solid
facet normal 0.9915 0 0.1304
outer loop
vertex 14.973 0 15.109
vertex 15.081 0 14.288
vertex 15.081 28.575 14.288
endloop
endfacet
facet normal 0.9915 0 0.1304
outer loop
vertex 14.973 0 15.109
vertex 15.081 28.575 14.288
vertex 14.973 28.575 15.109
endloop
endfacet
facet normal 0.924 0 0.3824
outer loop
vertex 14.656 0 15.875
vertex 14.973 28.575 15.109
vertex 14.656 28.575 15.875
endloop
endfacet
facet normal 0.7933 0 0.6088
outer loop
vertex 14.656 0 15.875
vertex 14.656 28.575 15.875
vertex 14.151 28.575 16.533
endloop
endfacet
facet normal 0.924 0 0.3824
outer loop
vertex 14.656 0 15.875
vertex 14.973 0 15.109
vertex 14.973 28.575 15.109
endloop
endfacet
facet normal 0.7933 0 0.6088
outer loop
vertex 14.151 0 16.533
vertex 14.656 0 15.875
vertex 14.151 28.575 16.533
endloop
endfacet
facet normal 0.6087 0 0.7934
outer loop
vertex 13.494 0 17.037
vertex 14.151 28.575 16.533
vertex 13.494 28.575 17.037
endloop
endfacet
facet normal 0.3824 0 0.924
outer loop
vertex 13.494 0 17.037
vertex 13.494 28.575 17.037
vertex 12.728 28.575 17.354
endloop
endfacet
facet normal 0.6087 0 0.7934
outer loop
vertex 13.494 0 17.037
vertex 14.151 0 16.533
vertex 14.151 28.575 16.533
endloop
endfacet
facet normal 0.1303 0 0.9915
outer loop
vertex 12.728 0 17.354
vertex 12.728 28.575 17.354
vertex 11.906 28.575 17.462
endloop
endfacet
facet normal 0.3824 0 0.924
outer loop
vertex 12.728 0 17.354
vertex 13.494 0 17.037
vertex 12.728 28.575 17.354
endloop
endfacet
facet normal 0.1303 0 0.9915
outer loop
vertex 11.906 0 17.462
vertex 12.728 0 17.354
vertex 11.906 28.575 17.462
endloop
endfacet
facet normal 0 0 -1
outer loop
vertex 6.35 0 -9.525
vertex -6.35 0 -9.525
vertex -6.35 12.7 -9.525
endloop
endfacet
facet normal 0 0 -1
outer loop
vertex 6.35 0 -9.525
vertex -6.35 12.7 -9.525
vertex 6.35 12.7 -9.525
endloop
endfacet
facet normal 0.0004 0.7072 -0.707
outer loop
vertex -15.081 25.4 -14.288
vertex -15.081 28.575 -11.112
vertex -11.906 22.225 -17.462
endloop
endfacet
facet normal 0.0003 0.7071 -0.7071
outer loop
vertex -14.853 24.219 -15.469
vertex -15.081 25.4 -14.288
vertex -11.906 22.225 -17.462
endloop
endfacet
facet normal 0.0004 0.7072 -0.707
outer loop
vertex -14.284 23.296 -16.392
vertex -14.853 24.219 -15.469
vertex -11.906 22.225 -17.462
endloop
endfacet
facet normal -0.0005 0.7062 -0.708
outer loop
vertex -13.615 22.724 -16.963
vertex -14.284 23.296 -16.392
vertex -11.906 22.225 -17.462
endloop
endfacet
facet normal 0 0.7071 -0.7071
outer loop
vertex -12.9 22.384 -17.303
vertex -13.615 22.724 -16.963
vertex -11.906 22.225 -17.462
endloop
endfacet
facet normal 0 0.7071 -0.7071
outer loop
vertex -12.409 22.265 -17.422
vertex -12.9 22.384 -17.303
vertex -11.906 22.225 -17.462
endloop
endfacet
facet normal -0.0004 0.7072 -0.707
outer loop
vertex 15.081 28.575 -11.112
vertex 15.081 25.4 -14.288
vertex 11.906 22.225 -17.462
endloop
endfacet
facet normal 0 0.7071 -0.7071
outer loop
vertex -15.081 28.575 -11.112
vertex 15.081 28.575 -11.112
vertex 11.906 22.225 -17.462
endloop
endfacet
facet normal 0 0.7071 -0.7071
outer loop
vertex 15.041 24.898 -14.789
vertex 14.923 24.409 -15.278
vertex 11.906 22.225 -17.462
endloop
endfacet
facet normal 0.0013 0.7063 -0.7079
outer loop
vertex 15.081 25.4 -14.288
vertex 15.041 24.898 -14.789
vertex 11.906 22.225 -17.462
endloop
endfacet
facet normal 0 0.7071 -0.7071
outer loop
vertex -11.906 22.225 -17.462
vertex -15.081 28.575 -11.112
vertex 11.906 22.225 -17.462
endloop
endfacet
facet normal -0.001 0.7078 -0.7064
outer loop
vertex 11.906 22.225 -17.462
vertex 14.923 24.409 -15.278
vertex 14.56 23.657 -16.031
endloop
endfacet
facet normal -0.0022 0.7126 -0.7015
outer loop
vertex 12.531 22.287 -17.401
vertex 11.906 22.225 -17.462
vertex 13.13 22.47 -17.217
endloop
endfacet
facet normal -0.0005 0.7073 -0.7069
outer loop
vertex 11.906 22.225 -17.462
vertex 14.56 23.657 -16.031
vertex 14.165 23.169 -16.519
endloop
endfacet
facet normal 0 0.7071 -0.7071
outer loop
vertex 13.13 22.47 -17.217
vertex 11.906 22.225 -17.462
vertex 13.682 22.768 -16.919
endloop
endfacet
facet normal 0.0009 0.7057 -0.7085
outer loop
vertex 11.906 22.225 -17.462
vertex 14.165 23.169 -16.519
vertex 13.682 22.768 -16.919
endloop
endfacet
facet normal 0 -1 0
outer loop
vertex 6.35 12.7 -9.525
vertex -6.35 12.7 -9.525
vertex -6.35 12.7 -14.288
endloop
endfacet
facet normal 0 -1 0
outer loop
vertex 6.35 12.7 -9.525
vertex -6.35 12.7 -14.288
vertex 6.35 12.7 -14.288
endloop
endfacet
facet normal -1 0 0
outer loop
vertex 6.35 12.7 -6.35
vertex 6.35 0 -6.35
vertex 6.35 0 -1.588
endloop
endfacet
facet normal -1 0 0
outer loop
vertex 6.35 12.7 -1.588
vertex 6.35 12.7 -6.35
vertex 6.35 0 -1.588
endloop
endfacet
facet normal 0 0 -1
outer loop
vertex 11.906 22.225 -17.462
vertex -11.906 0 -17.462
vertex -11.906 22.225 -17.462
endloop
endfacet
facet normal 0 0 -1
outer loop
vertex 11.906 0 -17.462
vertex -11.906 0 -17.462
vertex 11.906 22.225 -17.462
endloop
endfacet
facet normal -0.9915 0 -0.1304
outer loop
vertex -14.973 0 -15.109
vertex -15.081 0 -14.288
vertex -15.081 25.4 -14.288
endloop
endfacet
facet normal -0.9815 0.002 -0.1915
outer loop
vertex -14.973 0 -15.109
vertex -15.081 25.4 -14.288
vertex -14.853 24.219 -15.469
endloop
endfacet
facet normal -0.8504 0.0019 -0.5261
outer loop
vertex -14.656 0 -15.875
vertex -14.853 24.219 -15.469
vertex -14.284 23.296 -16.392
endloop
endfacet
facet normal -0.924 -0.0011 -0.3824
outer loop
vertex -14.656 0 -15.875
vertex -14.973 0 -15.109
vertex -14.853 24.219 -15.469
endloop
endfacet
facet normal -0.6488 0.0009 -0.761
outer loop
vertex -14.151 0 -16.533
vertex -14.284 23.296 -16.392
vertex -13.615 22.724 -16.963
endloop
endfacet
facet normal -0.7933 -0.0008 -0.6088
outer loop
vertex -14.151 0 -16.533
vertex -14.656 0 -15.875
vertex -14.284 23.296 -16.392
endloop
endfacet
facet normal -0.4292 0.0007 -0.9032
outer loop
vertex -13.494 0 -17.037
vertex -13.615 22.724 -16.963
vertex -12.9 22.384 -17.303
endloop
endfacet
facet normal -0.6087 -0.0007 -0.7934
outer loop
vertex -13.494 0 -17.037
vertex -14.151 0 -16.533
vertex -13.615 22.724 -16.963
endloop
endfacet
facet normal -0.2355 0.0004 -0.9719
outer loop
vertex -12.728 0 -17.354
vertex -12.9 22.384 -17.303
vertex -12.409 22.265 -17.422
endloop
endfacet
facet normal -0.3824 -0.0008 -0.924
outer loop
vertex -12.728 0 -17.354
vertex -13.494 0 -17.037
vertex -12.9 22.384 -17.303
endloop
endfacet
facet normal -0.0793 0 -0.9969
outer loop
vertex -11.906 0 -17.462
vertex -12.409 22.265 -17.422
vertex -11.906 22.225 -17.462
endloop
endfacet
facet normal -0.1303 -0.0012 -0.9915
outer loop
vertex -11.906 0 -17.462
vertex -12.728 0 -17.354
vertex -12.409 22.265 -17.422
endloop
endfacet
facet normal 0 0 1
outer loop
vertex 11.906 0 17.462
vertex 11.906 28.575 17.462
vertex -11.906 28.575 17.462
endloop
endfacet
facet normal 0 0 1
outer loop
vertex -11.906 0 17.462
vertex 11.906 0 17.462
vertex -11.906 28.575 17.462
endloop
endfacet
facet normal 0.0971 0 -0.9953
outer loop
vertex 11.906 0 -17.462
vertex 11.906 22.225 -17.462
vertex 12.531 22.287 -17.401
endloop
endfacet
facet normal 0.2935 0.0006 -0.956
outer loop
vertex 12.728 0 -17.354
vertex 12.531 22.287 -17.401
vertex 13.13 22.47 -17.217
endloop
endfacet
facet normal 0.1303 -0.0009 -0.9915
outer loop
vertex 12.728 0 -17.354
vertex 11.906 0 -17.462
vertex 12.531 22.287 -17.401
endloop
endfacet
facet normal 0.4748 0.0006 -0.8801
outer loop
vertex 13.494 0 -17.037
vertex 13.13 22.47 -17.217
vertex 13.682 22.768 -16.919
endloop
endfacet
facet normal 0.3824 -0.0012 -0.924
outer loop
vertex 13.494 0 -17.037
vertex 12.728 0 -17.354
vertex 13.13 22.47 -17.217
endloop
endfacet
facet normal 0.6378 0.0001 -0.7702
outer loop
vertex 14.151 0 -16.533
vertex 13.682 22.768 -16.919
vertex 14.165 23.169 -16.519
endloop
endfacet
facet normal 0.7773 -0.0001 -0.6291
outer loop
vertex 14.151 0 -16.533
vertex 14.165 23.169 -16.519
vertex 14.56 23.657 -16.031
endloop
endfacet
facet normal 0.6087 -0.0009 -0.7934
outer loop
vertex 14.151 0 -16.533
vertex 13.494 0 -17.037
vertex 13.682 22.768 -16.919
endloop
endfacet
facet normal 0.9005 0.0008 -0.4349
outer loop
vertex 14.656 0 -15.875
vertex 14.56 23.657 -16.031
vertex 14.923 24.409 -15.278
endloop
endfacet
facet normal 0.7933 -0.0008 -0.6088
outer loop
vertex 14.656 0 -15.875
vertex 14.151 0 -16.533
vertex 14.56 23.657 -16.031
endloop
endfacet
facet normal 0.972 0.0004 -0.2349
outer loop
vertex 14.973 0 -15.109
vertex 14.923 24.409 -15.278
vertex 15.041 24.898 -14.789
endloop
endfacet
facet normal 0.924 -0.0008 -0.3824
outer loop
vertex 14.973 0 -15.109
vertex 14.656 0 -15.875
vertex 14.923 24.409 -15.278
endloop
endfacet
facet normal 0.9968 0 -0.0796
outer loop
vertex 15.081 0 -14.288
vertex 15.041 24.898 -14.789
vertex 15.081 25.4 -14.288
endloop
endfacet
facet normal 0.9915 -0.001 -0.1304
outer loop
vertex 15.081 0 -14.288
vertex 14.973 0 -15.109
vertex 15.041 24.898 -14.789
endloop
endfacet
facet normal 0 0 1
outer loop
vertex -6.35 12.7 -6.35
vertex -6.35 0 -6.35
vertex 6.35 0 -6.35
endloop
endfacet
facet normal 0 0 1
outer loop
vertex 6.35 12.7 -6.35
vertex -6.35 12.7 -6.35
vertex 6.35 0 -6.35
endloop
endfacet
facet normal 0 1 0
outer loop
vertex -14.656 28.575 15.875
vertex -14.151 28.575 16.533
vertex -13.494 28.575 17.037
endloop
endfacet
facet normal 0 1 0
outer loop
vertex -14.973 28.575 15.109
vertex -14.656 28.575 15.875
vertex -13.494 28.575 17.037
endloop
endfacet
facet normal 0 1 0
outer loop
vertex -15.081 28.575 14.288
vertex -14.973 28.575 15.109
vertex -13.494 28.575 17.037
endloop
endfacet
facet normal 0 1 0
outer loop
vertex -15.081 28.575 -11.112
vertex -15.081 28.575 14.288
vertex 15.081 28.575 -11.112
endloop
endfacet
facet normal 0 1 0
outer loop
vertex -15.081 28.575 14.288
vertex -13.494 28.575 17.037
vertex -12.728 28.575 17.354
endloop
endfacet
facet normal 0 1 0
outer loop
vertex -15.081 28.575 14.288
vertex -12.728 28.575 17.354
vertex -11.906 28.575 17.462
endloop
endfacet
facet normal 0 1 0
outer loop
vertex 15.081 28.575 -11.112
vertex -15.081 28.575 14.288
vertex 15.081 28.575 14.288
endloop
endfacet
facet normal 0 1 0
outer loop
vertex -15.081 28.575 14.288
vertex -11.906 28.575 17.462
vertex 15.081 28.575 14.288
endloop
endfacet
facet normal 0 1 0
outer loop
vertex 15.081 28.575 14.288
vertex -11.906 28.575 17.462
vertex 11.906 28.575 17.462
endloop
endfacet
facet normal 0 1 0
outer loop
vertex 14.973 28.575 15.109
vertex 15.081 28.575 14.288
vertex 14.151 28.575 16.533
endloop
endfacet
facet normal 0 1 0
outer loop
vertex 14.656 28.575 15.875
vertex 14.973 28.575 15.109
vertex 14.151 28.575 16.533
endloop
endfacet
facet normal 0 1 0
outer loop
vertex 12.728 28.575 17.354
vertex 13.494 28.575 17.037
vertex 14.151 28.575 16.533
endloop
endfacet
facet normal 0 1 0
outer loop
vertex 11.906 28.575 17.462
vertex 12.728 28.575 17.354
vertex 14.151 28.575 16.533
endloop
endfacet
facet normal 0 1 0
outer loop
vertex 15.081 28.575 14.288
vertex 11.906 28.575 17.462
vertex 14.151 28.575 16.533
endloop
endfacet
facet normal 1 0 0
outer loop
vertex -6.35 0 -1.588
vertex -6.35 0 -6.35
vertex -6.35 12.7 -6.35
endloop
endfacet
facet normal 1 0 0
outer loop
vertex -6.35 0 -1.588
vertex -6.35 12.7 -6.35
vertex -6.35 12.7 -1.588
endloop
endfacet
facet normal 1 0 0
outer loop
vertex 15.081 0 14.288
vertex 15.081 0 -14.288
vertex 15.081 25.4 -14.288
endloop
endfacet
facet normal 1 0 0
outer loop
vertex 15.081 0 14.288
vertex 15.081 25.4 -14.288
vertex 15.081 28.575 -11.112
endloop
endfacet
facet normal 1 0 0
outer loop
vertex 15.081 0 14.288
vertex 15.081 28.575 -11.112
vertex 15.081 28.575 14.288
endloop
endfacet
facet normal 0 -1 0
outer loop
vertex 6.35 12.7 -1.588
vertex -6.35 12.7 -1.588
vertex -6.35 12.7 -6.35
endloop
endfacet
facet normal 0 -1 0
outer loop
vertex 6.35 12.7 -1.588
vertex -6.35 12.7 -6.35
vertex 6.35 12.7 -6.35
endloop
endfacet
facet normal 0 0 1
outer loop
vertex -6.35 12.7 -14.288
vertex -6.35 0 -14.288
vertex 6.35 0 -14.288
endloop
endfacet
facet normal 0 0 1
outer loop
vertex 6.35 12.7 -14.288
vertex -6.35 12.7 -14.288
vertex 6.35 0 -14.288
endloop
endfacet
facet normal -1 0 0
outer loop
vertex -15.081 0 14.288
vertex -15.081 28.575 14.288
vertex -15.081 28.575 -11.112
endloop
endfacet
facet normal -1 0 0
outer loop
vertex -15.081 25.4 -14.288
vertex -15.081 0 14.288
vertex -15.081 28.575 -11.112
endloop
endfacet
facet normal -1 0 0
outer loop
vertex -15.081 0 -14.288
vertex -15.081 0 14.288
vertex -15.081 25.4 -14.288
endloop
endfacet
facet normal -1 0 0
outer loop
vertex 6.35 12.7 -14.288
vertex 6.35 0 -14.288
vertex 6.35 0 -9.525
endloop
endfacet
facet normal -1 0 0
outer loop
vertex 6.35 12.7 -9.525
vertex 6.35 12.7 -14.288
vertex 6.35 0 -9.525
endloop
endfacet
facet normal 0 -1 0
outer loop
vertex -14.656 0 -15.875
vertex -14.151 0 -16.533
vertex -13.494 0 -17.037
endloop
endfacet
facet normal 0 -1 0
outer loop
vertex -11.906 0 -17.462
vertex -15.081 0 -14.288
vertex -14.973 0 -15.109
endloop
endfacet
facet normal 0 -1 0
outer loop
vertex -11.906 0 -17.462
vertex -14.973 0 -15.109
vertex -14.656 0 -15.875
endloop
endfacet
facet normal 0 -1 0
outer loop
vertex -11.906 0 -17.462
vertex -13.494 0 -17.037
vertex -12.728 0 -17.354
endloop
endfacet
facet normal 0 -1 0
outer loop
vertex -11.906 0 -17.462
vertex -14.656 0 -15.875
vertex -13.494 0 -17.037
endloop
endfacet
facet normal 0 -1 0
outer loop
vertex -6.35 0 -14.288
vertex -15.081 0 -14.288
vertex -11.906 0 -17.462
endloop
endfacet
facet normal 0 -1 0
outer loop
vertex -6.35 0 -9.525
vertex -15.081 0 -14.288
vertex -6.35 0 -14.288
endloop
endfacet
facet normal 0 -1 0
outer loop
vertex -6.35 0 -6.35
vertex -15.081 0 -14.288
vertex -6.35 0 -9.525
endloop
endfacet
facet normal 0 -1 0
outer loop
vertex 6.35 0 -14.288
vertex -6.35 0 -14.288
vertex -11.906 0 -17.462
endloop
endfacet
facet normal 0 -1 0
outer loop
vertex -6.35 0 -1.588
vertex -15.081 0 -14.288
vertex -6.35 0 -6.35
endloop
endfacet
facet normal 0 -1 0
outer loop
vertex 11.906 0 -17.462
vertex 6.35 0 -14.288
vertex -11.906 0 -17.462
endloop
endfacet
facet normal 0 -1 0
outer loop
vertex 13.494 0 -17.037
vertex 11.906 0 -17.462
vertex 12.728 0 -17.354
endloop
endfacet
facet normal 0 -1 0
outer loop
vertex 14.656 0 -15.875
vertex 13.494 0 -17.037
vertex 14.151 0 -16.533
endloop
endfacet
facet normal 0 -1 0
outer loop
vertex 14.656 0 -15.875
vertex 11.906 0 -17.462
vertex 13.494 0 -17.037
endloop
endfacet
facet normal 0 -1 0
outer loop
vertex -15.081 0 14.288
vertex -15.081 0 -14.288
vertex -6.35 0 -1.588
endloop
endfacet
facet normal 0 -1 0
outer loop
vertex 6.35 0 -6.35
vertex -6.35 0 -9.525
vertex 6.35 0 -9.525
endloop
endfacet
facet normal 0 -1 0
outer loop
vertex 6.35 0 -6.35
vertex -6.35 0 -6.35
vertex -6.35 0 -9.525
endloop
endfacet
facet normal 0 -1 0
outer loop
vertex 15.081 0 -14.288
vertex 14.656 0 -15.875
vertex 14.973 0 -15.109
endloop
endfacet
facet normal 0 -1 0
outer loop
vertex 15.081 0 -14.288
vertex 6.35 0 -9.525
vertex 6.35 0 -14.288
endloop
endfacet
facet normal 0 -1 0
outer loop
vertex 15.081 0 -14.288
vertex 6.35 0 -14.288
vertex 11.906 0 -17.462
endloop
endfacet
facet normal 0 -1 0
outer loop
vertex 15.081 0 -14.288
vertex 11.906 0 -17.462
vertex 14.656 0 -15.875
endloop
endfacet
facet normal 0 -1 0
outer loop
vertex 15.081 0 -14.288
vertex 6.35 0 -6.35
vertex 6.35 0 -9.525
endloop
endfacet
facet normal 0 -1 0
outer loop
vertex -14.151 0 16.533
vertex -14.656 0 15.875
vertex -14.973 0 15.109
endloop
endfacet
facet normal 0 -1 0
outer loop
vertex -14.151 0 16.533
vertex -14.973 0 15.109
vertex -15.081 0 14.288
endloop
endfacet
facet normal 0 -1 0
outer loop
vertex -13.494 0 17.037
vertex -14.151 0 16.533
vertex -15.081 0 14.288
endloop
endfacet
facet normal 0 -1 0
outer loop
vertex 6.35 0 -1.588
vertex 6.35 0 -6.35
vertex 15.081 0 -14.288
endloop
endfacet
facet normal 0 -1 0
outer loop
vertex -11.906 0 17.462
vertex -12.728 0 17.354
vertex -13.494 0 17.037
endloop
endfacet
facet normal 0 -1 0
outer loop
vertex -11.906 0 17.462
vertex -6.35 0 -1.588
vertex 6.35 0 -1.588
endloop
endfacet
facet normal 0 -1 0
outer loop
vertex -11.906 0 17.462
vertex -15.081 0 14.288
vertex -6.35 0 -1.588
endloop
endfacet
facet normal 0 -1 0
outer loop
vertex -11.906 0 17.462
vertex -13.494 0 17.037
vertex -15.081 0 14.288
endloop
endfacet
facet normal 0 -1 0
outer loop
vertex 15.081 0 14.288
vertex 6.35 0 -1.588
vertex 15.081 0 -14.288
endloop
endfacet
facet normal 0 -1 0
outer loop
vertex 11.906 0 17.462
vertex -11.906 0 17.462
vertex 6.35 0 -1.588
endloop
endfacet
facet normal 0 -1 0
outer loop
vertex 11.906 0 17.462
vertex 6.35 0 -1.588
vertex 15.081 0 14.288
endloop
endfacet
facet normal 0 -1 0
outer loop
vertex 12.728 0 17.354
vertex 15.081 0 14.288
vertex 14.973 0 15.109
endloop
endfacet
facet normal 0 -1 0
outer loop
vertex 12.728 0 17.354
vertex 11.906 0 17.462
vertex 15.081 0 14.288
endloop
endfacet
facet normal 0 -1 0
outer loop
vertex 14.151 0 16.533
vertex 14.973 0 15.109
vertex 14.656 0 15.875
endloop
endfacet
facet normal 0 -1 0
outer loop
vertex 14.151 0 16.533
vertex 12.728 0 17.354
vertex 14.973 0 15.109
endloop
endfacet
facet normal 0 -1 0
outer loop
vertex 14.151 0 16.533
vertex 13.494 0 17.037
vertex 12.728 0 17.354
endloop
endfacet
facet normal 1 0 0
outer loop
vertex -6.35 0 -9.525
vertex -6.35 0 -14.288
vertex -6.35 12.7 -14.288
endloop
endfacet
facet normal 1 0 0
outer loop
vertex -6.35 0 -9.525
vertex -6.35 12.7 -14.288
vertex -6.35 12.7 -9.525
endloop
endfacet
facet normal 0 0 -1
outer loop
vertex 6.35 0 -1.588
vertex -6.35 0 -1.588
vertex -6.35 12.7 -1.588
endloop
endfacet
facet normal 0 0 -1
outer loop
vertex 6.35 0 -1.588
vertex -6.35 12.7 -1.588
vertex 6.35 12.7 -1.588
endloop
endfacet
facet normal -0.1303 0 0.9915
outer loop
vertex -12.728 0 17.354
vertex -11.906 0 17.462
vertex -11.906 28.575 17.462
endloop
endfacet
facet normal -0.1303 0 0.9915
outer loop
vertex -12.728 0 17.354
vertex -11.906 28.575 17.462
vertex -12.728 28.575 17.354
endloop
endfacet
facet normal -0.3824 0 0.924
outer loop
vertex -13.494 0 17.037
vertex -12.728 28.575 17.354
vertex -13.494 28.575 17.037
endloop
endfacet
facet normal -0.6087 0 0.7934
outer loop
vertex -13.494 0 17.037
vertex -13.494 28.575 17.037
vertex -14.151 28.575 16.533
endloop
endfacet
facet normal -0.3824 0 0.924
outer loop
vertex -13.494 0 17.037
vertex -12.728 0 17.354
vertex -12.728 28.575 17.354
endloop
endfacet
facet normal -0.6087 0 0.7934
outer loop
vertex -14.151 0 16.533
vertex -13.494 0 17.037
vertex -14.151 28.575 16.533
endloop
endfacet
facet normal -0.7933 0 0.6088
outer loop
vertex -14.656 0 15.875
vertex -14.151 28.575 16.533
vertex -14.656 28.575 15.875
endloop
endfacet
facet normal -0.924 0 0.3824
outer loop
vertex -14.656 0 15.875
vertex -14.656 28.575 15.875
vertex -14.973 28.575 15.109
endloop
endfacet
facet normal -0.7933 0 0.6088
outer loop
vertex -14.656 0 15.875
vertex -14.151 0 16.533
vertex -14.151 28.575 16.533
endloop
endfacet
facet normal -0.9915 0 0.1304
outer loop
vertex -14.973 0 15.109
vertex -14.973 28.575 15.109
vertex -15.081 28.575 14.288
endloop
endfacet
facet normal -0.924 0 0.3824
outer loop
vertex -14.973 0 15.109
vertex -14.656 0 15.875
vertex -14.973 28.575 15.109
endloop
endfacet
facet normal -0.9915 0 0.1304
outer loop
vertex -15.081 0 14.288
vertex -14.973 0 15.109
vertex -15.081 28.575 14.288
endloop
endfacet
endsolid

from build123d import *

# Parameters (mm, degrees)
F1_DEPTH = 28.575
F3_DEPTH = 30.1635
F6_W     = 12.7
F6_H     = 4.7625
F7_DEPTH = 12.7


with BuildPart() as f1:
    # F0 (on Front) → F1 (new body)
    with BuildSketch(Plane.XZ):
        with BuildLine():
            ThreePointArc((15.08125, 14.2875), (14.151314, 16.532564), (11.90625, 17.4625))
            Line((11.90625, 17.4625), (-11.90625, 17.4625))
            ThreePointArc((-11.90625, 17.4625), (-14.151314, 16.532564), (-15.08125, 14.2875))
            Line((-15.08125, 14.2875), (-15.08125, -14.2875))
            ThreePointArc((-15.08125, -14.2875), (-14.151314, -16.532564), (-11.90625, -17.4625))
            Line((-11.90625, -17.4625), (11.90625, -17.4625))
            ThreePointArc((11.90625, -17.4625), (14.151314, -16.532564), (15.08125, -14.2875))
            Line((15.08125, -14.2875), (15.08125, 14.2875))
        make_face()
    extrude(amount=-F1_DEPTH)

    # F2 (on face) → F3 (cut, through all)
    with BuildSketch(Plane.YZ.offset(15.08125)):
        Polygon((28.575, -17.4625), (28.575, -11.1125), (22.225, -17.4625), align=None)
    extrude(amount=-F3_DEPTH, mode=Mode.SUBTRACT)

    # F6 (on face) → F7 (cut)
    with BuildSketch(Plane.XZ):
        with Locations((0, -11.90625)):
            Rectangle(F6_W, F6_H)
        with Locations((0, -3.96875)):
            Rectangle(F6_W, F6_H)
    extrude(amount=-F7_DEPTH, mode=Mode.SUBTRACT)


solid = f1.part
